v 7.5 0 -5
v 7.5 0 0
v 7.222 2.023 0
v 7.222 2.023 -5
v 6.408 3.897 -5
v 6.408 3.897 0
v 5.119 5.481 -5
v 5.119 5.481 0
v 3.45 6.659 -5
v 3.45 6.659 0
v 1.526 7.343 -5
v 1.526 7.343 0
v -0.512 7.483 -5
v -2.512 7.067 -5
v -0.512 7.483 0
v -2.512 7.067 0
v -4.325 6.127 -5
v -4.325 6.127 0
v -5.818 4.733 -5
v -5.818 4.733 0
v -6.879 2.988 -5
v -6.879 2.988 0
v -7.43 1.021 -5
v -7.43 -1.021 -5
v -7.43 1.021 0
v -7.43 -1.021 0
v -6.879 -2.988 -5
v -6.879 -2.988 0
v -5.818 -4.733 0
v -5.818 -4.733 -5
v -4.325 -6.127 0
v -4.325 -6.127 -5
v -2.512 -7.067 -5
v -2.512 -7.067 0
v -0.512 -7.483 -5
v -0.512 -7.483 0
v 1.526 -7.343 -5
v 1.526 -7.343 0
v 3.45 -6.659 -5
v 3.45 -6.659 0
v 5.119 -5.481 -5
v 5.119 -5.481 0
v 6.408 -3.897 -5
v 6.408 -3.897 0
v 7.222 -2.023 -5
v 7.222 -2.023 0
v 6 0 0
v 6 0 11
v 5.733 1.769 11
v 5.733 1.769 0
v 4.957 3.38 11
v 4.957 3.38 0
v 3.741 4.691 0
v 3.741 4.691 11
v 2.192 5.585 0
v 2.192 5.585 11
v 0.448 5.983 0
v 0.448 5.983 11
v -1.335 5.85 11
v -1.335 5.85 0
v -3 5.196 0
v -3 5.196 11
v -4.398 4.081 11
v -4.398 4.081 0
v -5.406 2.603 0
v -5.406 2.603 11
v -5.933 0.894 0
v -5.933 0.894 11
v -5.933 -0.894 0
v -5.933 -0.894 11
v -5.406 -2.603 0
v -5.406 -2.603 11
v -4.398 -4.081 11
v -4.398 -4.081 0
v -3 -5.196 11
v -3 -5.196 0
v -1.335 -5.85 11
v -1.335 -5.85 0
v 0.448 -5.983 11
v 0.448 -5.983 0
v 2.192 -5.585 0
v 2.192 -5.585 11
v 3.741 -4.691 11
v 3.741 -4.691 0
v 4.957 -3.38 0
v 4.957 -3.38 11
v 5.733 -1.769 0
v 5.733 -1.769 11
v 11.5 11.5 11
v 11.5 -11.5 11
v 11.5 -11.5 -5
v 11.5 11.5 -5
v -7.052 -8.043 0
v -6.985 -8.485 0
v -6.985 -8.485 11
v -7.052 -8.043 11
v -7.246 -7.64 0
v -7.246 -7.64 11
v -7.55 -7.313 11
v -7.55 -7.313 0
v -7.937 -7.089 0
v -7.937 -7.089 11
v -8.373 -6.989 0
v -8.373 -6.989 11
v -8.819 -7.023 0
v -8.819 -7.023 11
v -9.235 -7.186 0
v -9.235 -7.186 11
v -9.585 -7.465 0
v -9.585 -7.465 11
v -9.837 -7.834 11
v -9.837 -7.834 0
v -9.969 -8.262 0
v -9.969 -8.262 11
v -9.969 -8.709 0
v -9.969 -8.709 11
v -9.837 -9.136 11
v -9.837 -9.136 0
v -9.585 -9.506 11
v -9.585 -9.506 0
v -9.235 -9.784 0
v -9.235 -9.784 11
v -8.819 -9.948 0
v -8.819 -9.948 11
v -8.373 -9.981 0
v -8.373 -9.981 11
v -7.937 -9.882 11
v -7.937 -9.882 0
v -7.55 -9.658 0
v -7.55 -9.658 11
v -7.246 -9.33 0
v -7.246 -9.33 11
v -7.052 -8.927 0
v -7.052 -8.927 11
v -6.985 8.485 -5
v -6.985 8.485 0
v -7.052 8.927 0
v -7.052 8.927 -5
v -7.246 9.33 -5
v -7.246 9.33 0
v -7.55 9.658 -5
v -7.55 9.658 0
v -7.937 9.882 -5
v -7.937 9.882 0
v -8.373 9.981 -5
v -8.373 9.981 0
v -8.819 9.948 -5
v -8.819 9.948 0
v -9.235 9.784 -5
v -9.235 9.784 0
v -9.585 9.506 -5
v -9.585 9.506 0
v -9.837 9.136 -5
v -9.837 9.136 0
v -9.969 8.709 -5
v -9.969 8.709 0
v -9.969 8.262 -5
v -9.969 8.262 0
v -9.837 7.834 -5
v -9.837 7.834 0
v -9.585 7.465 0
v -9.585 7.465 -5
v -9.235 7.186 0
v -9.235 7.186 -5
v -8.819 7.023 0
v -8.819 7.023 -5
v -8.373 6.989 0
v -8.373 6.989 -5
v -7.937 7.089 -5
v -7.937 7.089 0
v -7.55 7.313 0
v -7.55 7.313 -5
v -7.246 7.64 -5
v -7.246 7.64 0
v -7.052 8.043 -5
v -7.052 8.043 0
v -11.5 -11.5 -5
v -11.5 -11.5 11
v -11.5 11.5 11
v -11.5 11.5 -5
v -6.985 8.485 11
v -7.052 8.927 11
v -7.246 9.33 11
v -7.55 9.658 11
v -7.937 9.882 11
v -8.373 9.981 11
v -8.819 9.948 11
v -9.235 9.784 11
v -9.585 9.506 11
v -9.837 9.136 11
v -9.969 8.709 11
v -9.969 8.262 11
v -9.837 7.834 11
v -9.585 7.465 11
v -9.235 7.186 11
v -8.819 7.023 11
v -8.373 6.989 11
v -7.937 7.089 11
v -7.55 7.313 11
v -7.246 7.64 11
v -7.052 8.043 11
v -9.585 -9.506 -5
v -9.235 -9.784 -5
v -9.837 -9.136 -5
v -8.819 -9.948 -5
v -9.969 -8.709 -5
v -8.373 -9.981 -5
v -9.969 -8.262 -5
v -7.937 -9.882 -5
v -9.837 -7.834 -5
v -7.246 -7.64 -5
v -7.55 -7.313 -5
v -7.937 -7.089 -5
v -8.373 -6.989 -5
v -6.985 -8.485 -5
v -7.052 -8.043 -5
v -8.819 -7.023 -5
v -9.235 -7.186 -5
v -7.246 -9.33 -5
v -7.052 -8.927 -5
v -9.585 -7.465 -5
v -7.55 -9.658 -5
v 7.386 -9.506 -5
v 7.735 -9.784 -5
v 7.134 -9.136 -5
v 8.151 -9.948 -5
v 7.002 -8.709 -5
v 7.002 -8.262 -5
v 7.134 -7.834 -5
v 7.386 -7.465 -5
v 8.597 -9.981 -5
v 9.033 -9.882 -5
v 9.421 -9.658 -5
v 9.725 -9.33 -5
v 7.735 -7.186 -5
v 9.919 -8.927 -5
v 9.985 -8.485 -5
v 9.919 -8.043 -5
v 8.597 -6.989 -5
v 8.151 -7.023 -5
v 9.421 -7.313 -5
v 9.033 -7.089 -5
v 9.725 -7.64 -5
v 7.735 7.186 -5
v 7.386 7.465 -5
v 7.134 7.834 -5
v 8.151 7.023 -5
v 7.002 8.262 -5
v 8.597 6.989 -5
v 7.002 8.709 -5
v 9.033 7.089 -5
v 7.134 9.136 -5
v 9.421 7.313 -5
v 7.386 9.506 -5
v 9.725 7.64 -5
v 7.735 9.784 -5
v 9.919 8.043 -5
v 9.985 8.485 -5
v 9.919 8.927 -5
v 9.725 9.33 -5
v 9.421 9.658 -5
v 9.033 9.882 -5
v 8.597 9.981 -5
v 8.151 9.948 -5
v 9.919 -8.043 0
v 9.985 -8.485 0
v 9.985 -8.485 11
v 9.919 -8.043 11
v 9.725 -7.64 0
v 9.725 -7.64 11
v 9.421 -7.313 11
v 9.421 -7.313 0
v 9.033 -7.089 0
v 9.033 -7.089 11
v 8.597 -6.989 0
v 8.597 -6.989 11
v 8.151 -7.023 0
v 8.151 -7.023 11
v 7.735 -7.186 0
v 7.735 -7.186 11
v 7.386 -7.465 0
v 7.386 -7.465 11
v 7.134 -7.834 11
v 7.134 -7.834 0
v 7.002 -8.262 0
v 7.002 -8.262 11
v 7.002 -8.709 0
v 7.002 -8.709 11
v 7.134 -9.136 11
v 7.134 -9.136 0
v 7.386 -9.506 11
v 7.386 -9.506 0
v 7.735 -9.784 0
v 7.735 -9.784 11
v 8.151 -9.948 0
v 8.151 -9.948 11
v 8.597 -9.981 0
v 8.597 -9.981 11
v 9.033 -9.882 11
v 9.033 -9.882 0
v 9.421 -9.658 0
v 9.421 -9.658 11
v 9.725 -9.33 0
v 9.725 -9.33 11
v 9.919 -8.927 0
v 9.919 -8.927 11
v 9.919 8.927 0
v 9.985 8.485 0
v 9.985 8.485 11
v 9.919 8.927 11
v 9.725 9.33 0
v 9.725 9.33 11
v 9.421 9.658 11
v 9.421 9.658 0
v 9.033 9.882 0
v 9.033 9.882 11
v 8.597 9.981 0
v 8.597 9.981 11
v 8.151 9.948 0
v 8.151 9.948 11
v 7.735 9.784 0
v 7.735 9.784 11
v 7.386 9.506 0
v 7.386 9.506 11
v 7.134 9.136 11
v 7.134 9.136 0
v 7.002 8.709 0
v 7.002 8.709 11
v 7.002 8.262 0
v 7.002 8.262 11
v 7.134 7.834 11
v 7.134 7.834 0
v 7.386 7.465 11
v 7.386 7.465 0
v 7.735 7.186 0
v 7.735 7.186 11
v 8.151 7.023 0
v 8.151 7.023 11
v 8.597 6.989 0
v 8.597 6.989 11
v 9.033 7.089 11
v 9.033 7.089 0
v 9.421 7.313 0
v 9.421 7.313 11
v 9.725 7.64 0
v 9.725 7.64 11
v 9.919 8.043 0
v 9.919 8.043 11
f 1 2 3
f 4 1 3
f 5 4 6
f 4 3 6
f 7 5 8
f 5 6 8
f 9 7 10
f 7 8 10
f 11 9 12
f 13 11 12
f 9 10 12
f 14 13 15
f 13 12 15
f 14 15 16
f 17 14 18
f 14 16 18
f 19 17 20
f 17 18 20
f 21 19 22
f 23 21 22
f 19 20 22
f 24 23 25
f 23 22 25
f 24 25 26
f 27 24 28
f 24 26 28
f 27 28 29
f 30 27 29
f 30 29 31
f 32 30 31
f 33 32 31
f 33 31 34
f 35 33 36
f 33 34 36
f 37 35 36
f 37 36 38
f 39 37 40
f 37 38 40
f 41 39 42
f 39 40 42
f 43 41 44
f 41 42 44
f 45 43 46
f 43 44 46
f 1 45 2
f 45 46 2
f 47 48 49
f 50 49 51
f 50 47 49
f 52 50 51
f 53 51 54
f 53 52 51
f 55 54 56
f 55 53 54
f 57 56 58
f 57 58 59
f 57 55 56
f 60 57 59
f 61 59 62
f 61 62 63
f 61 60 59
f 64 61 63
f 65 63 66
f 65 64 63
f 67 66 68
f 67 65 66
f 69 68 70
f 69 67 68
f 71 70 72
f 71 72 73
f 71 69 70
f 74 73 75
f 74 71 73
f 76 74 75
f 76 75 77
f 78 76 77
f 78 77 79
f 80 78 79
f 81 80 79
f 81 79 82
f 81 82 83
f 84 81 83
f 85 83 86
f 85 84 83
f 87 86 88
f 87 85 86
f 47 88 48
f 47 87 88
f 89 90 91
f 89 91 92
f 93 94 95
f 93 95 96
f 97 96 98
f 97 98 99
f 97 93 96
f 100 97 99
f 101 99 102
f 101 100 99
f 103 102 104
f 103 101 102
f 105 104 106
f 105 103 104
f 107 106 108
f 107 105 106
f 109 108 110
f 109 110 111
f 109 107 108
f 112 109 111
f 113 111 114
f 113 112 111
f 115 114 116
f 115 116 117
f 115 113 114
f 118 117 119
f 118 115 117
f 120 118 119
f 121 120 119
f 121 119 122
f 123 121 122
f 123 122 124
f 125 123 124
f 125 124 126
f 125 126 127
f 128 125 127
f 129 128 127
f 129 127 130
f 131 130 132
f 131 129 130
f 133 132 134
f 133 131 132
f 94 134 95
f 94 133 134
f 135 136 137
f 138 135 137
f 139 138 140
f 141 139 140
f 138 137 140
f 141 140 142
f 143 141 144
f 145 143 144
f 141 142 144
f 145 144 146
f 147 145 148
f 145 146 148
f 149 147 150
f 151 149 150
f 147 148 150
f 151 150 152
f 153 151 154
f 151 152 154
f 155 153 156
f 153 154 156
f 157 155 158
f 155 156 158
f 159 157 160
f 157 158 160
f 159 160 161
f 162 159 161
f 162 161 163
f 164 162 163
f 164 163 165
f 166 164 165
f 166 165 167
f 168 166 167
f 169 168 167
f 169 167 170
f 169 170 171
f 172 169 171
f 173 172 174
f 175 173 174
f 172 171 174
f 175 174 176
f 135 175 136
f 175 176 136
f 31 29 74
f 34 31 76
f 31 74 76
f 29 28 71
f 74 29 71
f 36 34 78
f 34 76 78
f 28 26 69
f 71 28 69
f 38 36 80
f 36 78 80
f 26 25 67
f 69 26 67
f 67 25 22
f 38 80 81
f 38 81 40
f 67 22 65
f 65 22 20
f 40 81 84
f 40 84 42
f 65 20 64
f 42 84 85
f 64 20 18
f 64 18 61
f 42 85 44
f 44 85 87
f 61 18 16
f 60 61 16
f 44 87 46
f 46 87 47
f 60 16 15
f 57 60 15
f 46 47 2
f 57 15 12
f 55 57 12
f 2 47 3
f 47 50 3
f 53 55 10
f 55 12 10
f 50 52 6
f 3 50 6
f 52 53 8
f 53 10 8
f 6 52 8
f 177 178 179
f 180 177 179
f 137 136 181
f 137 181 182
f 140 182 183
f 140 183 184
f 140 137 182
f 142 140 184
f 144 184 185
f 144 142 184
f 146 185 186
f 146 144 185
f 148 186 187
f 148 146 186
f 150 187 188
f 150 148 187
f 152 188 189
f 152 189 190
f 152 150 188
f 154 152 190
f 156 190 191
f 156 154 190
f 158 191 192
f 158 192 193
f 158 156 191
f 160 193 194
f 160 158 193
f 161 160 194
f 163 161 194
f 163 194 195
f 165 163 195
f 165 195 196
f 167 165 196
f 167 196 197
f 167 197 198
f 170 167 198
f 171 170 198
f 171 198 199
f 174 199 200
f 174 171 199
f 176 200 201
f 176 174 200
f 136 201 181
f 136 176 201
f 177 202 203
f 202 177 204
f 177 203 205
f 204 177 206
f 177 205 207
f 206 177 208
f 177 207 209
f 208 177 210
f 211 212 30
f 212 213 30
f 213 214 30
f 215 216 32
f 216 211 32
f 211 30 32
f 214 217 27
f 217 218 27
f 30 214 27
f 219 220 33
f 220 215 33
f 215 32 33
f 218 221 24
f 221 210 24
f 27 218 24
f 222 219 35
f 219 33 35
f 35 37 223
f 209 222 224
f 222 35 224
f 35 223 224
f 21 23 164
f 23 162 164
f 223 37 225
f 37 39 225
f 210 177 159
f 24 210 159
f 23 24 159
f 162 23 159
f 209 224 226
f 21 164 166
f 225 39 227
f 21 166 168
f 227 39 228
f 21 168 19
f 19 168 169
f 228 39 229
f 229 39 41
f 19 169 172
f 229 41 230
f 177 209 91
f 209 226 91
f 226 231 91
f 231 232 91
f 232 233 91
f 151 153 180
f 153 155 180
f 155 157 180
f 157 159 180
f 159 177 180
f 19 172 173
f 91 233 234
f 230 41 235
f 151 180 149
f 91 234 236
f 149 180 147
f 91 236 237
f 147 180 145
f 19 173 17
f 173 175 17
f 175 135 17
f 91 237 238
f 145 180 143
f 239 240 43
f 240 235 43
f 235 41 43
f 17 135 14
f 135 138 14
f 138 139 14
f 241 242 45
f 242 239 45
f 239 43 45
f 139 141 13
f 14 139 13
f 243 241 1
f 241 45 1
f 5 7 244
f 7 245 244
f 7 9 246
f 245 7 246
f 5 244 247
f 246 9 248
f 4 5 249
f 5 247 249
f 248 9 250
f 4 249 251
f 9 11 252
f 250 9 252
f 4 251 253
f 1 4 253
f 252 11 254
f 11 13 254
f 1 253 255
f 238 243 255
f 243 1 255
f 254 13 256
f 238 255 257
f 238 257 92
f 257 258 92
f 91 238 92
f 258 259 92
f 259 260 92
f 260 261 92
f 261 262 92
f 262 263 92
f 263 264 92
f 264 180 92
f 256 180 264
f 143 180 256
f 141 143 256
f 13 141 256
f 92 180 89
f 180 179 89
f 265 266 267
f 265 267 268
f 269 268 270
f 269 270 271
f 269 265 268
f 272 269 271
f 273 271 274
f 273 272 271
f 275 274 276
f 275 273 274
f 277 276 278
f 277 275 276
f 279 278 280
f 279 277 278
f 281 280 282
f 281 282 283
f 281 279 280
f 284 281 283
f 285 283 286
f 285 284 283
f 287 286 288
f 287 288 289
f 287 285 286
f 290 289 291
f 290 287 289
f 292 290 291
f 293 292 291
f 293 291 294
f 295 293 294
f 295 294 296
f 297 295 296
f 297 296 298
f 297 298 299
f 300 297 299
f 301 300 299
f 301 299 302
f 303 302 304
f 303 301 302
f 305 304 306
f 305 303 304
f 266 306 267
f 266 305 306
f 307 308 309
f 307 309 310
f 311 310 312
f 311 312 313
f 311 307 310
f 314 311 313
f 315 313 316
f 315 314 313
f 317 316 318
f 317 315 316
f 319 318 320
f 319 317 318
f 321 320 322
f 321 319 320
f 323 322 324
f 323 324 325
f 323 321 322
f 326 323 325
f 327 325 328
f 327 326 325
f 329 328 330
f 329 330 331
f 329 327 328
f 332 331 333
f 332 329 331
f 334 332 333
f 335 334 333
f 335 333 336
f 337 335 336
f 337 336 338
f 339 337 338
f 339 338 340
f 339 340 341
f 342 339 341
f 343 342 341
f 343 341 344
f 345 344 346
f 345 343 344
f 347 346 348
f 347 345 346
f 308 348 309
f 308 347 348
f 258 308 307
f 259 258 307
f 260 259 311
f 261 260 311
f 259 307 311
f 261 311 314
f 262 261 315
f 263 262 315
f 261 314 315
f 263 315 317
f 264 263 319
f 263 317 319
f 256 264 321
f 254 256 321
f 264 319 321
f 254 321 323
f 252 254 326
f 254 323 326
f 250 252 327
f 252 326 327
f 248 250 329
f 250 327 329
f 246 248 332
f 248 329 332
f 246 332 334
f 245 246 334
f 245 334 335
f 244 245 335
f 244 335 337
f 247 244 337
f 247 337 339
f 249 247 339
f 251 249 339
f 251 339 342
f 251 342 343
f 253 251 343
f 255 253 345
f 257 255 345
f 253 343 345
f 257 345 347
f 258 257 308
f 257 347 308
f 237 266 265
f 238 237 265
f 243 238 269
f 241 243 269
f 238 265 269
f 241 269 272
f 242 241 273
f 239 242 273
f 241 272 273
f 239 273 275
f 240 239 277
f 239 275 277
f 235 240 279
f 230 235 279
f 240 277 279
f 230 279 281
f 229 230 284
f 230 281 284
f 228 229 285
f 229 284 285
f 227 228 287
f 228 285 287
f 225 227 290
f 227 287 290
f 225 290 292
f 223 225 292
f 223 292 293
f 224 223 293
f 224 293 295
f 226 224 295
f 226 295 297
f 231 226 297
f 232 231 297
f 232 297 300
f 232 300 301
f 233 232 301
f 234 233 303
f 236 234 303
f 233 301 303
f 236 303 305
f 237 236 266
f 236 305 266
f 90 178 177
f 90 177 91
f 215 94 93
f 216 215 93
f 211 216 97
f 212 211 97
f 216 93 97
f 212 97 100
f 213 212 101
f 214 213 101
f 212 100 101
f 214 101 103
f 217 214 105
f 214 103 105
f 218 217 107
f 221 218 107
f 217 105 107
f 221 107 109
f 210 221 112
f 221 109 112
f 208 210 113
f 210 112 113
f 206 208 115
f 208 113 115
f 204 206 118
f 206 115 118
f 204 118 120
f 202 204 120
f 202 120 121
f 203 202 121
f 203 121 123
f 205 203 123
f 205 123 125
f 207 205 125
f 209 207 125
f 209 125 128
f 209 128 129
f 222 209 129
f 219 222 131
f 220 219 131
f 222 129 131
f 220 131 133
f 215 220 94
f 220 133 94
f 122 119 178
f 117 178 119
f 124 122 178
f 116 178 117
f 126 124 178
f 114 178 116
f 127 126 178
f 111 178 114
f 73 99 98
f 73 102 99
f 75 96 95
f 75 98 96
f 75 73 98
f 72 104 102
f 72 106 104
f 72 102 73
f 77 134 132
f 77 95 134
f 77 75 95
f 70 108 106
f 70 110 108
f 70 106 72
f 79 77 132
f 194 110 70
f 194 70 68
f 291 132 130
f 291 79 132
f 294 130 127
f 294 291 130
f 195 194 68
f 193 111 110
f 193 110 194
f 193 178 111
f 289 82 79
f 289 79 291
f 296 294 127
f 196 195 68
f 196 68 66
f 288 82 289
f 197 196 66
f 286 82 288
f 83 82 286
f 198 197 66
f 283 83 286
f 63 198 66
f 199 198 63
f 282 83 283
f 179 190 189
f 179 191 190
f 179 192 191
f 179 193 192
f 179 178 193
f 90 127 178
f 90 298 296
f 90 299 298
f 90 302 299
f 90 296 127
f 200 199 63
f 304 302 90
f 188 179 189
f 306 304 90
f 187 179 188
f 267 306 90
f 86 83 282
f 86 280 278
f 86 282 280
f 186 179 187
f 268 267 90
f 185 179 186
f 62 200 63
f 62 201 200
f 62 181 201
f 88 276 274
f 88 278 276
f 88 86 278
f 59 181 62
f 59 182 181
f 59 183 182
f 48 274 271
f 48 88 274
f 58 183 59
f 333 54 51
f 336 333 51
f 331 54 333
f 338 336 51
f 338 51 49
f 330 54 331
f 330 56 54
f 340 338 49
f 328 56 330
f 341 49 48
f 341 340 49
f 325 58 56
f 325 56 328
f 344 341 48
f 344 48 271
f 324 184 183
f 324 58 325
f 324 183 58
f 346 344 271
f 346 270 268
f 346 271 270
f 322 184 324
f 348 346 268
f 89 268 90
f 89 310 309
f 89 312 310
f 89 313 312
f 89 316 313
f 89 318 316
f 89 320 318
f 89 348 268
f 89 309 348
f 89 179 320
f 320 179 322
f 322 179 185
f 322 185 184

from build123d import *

# Parameters (mm, degrees)
SKETCH2_R           = 7.5
SKETCH2_R_2         = 6
EXTRUDE8_DEPTH      = 11
SKETCH2_14_W        = 23
SKETCH2_14_H        = 23
SKETCH2_14_R        = 7.5
SKETCH2_14_R_2      = 1.5
EXTRUDE9_DEPTH      = 11
EXTRUDE9_DEPTH_BACK = 5


with BuildPart() as part:
    # Sketch2 → Extrude8 (new body)
    with BuildSketch(Plane.XY):
        Circle(SKETCH2_R)
        Circle(SKETCH2_R_2, mode=Mode.SUBTRACT)
    extrude(amount=EXTRUDE8_DEPTH)

    # Sketch2<14> → Extrude9 (add, two sides)
    with BuildSketch(Plane.XY) as extrude9_sk:
        Rectangle(SKETCH2_14_W, SKETCH2_14_H)
        Circle(SKETCH2_14_R, mode=Mode.SUBTRACT)
        with Locations((8.485281374, 8.485281374)):
            Circle(SKETCH2_14_R_2, mode=Mode.SUBTRACT)
        with Locations((8.485281374, -8.485281374)):
            Circle(SKETCH2_14_R_2, mode=Mode.SUBTRACT)
        with Locations((-8.485281374, -8.485281374)):
            Circle(SKETCH2_14_R_2, mode=Mode.SUBTRACT)
        with Locations((-8.485281374, 8.485281374)):
            Circle(SKETCH2_14_R_2, mode=Mode.SUBTRACT)
    extrude(amount=EXTRUDE9_DEPTH)
    extrude(extrude9_sk.sketch, amount=-EXTRUDE9_DEPTH_BACK)


solid = part.part
